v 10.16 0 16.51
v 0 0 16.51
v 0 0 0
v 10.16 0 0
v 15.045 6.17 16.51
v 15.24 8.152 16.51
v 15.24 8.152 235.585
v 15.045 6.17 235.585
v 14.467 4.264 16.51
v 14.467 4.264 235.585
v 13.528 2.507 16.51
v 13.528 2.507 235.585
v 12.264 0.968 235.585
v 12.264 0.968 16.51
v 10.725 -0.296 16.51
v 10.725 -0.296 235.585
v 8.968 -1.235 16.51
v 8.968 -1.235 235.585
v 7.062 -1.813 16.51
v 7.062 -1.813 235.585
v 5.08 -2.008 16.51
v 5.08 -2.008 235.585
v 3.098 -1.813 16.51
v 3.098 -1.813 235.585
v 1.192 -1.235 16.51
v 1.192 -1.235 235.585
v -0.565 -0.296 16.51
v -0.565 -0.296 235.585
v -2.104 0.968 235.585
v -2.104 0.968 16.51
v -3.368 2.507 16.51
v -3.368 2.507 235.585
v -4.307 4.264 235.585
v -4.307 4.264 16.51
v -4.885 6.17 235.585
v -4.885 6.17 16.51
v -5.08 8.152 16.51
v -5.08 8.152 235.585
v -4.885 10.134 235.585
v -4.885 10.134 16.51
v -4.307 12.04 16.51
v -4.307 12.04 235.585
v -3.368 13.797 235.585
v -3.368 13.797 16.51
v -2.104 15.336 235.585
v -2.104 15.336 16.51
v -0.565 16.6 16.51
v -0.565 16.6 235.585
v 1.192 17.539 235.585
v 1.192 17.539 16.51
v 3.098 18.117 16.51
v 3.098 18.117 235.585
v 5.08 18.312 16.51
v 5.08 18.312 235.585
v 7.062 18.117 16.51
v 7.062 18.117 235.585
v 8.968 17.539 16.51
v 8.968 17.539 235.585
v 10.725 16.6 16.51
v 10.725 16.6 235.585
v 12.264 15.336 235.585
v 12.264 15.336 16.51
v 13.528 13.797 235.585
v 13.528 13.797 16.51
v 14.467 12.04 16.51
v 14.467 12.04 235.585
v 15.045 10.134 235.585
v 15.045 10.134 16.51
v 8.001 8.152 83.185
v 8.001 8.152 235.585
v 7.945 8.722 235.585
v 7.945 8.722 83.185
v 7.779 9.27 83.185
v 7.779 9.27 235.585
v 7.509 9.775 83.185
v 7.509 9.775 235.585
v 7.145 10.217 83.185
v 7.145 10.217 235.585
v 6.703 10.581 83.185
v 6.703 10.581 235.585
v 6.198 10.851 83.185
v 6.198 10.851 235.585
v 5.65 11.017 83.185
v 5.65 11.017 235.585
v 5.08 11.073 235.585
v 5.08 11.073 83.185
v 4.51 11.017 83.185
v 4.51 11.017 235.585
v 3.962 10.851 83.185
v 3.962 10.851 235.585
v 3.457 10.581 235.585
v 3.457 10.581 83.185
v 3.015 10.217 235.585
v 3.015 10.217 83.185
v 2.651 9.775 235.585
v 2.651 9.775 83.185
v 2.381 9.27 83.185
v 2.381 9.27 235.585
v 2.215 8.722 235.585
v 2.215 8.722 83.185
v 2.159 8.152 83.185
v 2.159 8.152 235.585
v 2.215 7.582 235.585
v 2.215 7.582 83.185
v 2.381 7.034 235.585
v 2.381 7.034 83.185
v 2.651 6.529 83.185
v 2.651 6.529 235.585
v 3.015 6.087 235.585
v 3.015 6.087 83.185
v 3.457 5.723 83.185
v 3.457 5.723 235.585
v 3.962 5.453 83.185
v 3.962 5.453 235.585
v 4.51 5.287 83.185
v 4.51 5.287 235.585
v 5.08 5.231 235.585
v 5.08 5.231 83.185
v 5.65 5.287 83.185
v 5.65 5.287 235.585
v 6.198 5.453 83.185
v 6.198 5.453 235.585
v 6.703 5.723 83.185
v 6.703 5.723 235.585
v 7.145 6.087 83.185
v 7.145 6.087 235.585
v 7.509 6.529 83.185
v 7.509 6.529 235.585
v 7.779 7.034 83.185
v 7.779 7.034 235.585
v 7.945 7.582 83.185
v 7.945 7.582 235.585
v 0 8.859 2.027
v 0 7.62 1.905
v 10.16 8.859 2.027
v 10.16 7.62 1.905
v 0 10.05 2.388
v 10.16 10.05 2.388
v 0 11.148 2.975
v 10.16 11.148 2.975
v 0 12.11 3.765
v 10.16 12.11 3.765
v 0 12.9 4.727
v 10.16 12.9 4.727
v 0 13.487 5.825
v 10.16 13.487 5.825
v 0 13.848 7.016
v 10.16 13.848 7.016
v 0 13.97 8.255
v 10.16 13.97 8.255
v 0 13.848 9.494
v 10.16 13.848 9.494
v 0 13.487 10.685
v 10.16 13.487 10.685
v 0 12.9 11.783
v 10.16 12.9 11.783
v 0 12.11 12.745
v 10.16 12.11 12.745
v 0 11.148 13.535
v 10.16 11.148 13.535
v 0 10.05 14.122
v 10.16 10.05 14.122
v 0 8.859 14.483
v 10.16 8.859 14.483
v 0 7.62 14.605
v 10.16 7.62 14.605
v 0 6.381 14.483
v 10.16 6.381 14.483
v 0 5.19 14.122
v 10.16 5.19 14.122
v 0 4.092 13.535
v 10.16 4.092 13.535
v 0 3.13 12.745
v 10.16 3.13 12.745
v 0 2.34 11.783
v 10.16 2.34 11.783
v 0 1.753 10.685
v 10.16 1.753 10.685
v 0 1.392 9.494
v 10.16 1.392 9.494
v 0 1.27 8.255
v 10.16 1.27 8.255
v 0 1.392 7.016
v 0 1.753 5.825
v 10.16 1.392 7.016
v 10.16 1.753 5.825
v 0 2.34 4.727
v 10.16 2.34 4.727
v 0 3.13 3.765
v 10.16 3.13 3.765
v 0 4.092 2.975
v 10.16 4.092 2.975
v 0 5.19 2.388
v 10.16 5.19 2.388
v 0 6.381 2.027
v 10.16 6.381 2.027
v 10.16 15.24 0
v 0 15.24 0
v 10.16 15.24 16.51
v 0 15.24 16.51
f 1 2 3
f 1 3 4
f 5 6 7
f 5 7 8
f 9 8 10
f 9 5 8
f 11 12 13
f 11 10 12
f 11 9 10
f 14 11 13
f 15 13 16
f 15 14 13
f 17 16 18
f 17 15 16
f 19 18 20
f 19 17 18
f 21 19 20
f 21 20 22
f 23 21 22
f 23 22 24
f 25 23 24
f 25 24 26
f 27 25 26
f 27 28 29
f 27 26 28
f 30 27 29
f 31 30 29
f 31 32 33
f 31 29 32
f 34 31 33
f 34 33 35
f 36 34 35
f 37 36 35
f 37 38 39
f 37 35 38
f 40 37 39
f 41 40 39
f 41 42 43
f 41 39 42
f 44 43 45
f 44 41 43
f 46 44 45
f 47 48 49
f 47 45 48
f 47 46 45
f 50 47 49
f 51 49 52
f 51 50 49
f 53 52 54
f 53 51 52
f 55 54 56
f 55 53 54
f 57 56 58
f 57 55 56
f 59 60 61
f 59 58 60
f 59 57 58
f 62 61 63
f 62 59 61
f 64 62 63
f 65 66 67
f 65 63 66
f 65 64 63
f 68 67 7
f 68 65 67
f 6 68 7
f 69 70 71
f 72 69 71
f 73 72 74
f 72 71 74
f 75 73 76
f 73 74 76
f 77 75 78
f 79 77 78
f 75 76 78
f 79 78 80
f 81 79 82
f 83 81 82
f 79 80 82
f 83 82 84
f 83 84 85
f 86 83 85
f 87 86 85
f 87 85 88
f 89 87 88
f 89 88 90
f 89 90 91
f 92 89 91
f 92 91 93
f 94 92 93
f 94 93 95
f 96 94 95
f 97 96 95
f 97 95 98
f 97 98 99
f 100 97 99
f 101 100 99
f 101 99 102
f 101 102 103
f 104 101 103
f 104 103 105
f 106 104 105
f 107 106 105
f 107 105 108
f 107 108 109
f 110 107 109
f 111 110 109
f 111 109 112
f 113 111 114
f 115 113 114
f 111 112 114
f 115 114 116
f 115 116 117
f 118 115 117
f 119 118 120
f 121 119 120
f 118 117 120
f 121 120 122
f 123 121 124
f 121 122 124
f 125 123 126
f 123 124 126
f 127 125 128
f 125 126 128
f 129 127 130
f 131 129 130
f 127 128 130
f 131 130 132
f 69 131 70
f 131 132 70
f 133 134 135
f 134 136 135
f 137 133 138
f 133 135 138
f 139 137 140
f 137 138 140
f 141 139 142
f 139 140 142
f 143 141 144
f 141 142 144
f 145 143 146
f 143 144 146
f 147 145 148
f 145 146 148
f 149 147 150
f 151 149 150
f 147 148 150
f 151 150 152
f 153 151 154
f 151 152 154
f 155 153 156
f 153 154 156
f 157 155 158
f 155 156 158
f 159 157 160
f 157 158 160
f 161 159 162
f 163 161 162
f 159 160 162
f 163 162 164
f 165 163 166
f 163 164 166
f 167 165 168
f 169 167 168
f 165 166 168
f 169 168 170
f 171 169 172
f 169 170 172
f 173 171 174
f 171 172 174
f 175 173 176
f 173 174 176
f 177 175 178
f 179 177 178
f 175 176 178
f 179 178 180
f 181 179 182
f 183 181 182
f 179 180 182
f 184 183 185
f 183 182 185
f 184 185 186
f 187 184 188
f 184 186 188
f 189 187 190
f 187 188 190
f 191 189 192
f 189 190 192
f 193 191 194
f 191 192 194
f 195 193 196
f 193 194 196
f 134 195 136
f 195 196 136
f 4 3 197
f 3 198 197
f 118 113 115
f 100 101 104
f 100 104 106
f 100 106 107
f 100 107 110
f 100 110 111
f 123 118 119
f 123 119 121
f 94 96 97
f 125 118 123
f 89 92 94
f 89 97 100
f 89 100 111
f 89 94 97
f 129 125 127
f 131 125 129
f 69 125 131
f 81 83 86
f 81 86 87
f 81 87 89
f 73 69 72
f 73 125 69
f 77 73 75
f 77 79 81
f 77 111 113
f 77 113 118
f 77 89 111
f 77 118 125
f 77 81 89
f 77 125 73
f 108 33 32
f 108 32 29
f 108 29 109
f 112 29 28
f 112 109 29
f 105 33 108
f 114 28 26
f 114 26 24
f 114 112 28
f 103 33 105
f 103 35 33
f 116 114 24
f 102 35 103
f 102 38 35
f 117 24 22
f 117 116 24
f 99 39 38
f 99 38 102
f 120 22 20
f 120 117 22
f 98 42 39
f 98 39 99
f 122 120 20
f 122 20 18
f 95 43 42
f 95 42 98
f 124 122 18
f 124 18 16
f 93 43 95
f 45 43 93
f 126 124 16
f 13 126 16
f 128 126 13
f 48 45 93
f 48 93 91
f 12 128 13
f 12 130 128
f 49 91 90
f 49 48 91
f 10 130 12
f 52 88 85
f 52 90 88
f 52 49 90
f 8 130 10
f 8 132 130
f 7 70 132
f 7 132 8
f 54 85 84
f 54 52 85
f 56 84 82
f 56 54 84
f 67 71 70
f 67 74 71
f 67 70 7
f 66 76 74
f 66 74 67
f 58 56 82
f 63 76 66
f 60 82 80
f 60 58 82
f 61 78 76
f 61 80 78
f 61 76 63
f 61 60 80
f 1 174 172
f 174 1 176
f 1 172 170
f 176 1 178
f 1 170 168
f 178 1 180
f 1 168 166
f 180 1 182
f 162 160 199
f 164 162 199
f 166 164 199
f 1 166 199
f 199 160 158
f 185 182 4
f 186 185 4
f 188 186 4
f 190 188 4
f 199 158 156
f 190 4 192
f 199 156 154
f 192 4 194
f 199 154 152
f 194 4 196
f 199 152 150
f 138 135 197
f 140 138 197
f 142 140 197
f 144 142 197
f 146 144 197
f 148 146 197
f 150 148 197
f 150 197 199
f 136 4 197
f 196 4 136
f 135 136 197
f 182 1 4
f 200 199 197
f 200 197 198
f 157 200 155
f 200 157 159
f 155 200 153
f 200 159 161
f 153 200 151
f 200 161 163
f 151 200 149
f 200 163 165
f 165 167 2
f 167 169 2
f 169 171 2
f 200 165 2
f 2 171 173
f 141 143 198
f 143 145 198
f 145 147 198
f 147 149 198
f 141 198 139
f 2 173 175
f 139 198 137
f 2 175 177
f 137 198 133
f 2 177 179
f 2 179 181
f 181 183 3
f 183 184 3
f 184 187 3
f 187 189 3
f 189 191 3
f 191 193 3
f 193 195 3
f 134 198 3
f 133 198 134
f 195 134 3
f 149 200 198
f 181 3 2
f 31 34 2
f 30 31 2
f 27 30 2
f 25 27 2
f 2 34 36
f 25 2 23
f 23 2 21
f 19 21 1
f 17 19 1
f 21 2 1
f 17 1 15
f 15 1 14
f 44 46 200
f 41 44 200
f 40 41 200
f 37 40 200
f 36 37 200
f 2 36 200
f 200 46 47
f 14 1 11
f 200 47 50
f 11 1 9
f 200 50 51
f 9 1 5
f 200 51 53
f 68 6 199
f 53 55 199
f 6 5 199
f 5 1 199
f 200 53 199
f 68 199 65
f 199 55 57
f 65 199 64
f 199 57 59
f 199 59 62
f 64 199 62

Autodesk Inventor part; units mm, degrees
ref_plane "YZ Plane" through (0, 0, 0) normal (1, 0, 0) x (0, 1, 0)
ref_plane "XZ Plane" through (0, 0, 0) normal (0, 1, 0) x (-1, 0, 0)
ref_plane "XY Plane" through (0, 0, 0) normal (0, 0, 1) x (1, 0, 0)
sketch "Sketch1" plane through (0, 0, 0) normal (0, 0, 1) x (1, 0, 0)
  line L0 (0, 0) -> (10.16, 0)
  line L1 (10.16, 0) -> (10.16, 15.24)
  line L2 (10.16, 15.24) -> (0, 15.24)
  line L3 (0, 15.24) -> (0, 0)
  dimension "d0" = 10.16
  dimension "d1" = 15.24
extrude "Extrusion1" add sketch "Sketch1" along normal blind 16.51
sketch "Sketch2" plane through (10.16, 0, 0) normal (1, 0, 0) x (0, 0, -1)
  circle A0 centre (-8.255, 7.62) radius 6.35
  line L0 (0, 15.24) -> (-16.51, 15.24) projected
  point P0 (0, 0)
  dimension "d4" = 12.7
  dimension "d5" = 7.62
extrude "Extrusion2" cut sketch "Sketch2" against normal blind 16.51
sketch "Sketch3" plane through (0, 0, 16.51) normal (0, 0, 1) x (1, 0, 0)
  circle A0 centre (5.08, 8.152) radius 10.16
  point P0 (0, 0)
  dimension "d8" = 20.32
extrude "Extrusion3" add sketch "Sketch3" along normal blind 219.075
sketch "Sketch5" plane through (5.08, 8.152, 235.585) normal (0, 0, 1) x (1, 0, 0)
  circle A0 centre (0, 0) radius 2.921
  point P0 (-5.08, -8.152)
  dimension "d13" = 5.842
extrude "Extrusion5" cut sketch "Sketch5" against normal blind 152.4
properties part number "SolenoidCase"
